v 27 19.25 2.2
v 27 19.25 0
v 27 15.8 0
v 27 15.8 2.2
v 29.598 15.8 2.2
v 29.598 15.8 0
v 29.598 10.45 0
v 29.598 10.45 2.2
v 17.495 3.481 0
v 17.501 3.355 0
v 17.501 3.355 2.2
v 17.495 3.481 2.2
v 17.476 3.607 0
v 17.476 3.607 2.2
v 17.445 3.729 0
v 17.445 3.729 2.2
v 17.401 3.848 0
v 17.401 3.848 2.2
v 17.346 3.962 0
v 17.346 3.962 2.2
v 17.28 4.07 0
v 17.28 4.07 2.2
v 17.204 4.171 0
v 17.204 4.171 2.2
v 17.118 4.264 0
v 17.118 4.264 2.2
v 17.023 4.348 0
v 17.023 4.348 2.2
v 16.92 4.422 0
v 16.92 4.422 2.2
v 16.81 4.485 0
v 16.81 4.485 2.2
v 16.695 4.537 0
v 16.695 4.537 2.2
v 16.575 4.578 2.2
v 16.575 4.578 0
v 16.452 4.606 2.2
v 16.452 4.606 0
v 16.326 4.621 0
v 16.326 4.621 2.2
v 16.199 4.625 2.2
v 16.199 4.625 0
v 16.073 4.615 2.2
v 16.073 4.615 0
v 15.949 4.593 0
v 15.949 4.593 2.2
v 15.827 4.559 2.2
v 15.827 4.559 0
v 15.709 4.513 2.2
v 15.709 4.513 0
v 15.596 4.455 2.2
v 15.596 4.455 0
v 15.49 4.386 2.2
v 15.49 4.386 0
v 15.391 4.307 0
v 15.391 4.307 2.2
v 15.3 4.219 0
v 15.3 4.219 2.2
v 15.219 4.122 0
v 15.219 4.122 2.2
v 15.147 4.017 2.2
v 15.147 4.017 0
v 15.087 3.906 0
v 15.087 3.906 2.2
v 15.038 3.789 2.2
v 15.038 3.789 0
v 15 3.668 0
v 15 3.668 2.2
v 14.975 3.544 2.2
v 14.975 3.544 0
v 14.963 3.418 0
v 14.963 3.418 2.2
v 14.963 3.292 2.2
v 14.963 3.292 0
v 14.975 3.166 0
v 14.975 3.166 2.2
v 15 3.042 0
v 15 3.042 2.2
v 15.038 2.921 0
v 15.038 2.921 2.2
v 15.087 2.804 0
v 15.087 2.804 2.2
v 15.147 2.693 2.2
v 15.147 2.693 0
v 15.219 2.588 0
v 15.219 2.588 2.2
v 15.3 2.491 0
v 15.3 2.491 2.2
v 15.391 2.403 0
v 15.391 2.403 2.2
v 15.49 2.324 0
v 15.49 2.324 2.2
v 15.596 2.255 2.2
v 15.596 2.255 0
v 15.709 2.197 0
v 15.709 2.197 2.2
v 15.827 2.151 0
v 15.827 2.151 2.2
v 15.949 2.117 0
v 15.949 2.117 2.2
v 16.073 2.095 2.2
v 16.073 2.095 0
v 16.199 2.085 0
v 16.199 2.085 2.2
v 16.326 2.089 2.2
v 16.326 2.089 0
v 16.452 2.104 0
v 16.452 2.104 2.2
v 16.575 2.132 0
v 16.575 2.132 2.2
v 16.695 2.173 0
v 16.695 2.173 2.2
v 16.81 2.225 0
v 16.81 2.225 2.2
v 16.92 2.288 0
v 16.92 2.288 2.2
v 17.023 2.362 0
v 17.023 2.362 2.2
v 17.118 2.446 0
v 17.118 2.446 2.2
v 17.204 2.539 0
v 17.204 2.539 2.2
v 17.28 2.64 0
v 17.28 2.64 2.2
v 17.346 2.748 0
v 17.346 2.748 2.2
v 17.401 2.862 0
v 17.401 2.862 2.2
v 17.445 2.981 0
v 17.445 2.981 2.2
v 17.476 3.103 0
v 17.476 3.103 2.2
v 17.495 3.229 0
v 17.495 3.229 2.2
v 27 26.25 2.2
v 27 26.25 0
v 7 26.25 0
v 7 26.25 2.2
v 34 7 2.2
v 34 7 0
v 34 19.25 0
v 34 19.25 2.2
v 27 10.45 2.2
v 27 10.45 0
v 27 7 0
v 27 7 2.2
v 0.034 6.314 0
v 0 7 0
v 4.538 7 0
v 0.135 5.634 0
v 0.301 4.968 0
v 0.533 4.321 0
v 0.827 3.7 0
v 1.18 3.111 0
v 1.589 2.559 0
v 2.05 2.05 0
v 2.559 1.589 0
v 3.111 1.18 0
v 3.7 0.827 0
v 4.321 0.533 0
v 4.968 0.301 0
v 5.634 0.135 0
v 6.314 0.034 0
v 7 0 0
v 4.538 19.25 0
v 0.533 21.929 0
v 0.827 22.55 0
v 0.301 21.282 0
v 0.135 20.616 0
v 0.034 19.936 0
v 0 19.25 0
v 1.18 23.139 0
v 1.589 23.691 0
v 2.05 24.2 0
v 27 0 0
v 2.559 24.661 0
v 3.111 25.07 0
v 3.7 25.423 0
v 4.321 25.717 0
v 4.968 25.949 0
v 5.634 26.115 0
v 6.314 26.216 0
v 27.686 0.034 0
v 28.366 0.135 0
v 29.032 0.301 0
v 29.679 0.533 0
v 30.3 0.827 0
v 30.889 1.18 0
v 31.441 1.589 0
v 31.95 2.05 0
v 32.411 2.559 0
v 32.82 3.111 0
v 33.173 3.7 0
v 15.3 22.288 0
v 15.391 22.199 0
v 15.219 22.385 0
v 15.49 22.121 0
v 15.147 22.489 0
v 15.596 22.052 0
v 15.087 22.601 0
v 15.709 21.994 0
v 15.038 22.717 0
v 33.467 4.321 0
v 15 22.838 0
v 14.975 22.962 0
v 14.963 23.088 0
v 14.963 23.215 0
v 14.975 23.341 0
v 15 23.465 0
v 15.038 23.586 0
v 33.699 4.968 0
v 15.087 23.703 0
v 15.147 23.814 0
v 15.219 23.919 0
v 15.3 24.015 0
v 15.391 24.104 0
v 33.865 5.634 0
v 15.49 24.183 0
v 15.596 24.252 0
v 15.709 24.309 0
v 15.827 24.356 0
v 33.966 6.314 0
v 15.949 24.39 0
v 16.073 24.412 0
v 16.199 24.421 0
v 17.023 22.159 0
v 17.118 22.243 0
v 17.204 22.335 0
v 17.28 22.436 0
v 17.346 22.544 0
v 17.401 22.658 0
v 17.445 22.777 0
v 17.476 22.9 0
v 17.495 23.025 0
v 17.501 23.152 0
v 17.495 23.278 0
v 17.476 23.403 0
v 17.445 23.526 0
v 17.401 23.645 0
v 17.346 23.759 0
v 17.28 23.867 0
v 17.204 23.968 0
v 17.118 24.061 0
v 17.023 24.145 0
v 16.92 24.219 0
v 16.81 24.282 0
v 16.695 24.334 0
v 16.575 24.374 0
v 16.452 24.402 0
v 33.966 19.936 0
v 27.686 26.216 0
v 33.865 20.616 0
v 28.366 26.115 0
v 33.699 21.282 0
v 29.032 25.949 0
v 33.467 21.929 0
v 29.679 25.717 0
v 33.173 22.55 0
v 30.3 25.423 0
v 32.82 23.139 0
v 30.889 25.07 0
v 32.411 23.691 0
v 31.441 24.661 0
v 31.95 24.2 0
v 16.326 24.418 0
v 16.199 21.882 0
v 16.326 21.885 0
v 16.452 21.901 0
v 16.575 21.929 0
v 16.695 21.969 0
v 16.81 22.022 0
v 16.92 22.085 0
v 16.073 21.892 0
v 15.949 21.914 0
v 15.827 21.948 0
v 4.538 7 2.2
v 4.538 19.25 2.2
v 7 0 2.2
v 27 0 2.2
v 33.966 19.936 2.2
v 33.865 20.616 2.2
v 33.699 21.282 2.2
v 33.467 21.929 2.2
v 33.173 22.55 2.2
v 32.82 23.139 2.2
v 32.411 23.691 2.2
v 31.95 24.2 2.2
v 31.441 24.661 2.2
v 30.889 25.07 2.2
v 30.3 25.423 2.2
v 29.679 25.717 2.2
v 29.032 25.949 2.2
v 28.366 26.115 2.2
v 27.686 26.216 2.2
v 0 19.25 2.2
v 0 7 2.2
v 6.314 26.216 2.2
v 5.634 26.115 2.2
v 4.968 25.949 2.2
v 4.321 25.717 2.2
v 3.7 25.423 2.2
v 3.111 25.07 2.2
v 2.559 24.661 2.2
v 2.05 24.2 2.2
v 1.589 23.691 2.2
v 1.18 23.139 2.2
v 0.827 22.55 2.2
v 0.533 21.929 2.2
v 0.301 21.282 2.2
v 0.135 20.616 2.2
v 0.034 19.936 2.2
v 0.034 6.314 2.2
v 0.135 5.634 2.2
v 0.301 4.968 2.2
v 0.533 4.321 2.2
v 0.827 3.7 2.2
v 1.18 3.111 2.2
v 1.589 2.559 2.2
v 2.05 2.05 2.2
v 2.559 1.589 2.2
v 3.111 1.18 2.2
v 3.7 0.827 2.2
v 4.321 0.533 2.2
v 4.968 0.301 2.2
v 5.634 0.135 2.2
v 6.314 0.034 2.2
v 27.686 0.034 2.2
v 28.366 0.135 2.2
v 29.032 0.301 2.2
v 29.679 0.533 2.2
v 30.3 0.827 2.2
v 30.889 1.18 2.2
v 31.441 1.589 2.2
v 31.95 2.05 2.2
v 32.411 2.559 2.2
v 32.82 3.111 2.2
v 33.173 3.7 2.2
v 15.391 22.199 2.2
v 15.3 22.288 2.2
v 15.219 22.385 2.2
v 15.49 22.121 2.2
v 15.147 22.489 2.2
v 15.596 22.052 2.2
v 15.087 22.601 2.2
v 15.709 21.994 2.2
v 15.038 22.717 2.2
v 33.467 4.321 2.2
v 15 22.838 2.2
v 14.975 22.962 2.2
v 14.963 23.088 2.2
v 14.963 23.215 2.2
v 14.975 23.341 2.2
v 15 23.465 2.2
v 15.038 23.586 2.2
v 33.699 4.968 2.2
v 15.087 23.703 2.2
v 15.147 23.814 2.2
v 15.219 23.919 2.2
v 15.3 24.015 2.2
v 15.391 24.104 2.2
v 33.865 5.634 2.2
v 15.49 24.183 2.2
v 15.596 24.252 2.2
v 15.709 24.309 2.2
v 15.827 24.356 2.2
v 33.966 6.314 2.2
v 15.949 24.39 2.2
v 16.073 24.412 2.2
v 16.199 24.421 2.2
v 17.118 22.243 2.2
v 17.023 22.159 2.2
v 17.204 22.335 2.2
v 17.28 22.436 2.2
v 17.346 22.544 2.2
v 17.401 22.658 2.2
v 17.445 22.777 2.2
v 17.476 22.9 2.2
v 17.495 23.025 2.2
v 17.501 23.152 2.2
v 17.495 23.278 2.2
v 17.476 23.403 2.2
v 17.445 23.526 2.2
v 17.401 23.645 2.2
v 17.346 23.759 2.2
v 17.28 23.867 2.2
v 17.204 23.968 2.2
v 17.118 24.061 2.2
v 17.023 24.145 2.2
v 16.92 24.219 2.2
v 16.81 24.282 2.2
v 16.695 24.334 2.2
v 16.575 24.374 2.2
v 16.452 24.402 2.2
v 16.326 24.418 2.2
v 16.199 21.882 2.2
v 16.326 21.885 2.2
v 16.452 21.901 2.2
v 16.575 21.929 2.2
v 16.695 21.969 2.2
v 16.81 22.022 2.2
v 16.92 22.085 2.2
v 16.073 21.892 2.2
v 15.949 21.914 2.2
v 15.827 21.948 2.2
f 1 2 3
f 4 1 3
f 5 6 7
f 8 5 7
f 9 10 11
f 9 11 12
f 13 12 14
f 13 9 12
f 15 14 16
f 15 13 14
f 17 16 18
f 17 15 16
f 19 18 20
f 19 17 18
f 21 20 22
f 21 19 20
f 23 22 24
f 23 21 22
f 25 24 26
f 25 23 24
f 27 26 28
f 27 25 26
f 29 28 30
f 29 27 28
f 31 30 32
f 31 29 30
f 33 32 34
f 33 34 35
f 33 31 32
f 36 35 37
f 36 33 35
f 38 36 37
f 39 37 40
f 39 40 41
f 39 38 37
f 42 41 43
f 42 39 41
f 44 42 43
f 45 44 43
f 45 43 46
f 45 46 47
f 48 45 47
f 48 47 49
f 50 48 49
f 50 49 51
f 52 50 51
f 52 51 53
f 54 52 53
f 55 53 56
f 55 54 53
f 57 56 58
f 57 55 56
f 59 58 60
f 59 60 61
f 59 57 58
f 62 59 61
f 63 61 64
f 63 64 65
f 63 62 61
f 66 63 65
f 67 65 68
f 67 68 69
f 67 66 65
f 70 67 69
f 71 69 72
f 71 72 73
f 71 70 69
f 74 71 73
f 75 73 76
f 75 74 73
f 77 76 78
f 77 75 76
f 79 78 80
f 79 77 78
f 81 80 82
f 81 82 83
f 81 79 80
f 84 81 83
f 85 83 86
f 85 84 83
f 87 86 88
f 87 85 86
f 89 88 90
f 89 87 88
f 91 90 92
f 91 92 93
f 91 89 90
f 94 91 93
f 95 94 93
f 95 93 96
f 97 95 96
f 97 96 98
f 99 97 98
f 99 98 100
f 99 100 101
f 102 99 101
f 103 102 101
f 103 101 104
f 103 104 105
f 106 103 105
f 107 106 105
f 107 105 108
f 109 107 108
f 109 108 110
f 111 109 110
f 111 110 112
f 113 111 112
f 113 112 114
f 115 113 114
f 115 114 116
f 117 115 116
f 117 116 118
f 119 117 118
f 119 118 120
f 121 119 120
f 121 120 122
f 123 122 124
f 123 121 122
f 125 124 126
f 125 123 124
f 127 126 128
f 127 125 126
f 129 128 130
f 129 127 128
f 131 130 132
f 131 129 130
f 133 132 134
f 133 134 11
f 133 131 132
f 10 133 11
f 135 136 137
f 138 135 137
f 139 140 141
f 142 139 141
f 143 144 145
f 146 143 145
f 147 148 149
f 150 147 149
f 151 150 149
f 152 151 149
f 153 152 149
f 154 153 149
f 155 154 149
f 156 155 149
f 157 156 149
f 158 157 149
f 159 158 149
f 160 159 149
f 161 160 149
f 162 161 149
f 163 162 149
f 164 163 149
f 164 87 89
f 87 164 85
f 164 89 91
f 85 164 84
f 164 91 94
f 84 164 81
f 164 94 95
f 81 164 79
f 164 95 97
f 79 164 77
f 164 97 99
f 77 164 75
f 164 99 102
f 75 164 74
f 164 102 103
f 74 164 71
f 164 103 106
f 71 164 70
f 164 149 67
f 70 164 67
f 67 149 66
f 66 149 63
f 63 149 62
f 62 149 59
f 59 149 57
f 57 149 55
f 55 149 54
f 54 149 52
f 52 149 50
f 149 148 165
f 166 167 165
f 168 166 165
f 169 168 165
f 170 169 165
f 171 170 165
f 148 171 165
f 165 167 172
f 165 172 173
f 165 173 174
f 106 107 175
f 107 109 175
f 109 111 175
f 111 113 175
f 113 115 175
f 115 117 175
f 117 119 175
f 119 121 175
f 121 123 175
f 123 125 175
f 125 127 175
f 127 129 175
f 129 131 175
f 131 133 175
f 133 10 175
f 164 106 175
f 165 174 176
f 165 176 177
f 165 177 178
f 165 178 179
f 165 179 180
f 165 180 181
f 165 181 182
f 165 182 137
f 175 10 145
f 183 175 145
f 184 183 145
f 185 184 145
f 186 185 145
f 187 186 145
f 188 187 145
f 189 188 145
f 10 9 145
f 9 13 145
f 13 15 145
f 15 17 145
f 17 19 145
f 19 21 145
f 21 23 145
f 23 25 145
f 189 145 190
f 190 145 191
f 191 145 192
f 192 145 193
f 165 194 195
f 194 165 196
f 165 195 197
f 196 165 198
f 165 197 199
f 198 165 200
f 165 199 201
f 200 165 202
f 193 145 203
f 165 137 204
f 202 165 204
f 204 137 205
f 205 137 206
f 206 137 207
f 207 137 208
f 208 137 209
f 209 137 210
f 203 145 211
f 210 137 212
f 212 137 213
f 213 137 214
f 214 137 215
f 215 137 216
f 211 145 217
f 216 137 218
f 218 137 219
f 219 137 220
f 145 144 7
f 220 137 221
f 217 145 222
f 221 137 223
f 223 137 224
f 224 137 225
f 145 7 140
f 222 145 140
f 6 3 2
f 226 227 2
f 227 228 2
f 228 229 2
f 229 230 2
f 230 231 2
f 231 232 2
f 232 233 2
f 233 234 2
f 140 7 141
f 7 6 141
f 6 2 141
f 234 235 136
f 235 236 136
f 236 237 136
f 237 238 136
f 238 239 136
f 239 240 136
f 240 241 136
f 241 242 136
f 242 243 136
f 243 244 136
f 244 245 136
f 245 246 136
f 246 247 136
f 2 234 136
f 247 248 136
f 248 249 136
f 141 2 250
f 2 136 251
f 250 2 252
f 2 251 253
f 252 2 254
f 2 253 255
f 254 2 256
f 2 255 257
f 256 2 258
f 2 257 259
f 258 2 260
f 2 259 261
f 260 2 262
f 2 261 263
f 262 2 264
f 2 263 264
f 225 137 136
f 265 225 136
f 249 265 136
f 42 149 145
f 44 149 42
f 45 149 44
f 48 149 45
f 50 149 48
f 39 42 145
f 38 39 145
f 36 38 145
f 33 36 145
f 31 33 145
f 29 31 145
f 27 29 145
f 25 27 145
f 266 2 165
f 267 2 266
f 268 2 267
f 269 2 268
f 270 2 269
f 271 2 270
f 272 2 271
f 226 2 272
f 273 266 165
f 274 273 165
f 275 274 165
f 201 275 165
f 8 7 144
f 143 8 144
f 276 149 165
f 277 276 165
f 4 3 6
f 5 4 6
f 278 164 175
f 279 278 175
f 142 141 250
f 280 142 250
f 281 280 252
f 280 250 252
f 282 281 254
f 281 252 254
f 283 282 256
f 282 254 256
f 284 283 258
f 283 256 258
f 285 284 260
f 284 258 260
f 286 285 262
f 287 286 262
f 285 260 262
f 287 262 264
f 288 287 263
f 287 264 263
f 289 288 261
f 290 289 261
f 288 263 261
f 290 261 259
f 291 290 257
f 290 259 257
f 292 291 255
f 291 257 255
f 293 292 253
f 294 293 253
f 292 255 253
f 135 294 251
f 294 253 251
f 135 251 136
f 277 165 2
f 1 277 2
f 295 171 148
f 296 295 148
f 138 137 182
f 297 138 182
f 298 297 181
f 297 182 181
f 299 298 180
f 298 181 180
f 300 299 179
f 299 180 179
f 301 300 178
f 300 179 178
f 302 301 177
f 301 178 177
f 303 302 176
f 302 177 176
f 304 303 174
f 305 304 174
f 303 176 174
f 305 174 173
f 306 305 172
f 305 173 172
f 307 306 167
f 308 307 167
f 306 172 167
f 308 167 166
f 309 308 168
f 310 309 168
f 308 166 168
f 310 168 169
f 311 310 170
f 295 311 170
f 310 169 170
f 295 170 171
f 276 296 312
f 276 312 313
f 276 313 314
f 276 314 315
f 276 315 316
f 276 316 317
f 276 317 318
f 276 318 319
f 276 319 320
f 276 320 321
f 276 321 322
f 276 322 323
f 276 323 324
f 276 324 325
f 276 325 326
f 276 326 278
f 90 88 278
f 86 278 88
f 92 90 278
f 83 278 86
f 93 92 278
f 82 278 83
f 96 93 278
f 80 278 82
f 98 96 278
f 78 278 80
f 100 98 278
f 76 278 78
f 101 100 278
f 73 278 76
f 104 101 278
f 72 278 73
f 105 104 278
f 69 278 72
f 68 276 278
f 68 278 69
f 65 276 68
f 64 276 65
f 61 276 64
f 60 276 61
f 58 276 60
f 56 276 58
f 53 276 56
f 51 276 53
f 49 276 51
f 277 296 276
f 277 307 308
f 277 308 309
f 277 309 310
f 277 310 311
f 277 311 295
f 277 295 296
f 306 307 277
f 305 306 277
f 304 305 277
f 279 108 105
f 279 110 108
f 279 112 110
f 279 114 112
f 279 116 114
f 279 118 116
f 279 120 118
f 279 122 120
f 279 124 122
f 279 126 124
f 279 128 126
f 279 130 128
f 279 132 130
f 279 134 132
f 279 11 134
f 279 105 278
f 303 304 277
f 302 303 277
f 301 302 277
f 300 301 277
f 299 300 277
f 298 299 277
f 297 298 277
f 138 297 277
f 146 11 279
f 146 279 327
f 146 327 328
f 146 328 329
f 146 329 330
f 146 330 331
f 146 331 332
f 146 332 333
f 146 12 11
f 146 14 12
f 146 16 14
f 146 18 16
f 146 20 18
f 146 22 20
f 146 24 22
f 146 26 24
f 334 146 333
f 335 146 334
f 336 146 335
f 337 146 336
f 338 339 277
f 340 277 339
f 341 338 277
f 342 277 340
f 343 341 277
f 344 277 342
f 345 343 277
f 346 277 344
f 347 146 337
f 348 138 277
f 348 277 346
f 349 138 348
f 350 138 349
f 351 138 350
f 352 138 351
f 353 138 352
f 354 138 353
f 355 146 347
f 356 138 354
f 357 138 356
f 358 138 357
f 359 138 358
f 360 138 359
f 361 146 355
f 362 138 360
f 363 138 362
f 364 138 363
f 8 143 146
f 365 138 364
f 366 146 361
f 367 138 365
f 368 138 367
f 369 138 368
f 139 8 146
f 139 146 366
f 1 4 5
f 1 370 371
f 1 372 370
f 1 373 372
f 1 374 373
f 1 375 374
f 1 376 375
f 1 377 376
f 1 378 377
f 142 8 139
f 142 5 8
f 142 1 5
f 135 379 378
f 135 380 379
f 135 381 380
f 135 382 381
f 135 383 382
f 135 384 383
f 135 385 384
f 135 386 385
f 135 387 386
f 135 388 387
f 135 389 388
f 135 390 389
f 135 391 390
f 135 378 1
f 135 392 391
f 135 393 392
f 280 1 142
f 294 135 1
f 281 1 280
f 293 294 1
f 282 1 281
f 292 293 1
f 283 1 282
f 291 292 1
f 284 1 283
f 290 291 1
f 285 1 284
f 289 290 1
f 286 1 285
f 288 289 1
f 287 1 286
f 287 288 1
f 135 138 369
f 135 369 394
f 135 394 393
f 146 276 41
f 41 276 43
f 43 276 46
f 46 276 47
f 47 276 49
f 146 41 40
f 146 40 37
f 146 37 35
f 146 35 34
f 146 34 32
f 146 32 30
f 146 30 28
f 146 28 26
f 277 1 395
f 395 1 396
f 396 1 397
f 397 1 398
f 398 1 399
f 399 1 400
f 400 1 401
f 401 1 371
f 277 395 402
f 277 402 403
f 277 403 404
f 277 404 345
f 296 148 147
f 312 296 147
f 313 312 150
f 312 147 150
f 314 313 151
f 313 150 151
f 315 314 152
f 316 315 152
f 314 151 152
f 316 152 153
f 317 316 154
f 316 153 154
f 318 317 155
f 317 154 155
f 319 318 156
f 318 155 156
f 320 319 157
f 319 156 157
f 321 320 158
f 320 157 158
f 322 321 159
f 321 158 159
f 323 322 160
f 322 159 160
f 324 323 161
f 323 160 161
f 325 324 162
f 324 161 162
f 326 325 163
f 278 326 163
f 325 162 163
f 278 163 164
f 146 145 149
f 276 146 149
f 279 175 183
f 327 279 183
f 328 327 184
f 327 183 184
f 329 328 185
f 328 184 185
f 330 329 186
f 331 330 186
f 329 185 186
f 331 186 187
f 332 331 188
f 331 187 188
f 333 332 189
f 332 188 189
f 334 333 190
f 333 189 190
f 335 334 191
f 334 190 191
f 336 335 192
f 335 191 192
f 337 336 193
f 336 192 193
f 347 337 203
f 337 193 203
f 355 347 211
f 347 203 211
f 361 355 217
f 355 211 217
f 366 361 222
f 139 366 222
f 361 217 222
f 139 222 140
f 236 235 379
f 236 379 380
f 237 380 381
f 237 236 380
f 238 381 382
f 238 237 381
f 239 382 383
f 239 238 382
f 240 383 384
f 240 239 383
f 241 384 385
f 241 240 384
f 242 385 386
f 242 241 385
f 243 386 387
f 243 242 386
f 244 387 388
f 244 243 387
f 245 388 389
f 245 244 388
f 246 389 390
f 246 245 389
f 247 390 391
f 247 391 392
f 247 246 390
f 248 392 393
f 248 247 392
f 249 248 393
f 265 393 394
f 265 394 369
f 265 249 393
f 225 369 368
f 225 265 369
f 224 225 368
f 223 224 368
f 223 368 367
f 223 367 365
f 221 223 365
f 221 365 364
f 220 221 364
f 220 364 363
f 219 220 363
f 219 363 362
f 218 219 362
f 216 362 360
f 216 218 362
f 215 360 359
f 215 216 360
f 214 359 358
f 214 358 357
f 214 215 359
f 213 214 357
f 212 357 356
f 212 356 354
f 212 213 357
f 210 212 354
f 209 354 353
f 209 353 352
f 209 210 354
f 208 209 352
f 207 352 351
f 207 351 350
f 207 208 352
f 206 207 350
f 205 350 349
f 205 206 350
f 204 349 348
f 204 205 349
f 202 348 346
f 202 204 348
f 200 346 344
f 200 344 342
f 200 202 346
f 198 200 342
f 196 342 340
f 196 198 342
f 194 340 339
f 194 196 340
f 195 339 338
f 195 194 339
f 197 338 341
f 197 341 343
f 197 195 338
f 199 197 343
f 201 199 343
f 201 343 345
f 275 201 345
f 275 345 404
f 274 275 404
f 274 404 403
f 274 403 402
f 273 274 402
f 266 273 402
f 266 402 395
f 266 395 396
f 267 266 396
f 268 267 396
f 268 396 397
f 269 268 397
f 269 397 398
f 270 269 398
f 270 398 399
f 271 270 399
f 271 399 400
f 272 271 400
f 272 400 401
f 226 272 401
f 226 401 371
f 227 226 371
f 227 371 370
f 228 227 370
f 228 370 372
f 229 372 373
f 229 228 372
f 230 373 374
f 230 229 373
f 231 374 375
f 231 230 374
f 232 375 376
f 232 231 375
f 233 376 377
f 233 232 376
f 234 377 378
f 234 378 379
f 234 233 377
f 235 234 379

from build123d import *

# Parameters (mm, degrees)
F0_R     = 1.27
F1_DEPTH = 2.2


with BuildPart() as f1:
    # F0 (on Top) → F1 (new body)
    with BuildSketch(Plane.XY):
        with BuildLine():
            ThreePointArc((0, 7), (2.050253, 2.050253), (7, 0))
            Line((7, 0), (27, 0))
            ThreePointArc((27, 0), (31.949747, 2.050253), (34, 7))
            Line((34, 7), (34, 19.25))
            ThreePointArc((34, 19.25), (31.949747, 24.199747), (27, 26.25))
            Line((27, 26.25), (7, 26.25))
            ThreePointArc((7, 26.25), (2.050253, 24.199747), (0, 19.25))
            Line((0, 19.25), (0, 7))
        make_face()
        with Locations((16.231103, 3.355003)):
            Circle(F0_R, mode=Mode.SUBTRACT)
        with Locations((16.231103, 23.15167)):
            Circle(F0_R, mode=Mode.SUBTRACT)
        Polygon((4.537634, 7), (4.537634, 19.25), (27, 19.25), (27, 15.8), (29.597666, 15.8), (29.597666, 10.45), (27, 10.45), (27, 7), align=None, mode=Mode.SUBTRACT)
    extrude(amount=F1_DEPTH)


solid = f1.part
